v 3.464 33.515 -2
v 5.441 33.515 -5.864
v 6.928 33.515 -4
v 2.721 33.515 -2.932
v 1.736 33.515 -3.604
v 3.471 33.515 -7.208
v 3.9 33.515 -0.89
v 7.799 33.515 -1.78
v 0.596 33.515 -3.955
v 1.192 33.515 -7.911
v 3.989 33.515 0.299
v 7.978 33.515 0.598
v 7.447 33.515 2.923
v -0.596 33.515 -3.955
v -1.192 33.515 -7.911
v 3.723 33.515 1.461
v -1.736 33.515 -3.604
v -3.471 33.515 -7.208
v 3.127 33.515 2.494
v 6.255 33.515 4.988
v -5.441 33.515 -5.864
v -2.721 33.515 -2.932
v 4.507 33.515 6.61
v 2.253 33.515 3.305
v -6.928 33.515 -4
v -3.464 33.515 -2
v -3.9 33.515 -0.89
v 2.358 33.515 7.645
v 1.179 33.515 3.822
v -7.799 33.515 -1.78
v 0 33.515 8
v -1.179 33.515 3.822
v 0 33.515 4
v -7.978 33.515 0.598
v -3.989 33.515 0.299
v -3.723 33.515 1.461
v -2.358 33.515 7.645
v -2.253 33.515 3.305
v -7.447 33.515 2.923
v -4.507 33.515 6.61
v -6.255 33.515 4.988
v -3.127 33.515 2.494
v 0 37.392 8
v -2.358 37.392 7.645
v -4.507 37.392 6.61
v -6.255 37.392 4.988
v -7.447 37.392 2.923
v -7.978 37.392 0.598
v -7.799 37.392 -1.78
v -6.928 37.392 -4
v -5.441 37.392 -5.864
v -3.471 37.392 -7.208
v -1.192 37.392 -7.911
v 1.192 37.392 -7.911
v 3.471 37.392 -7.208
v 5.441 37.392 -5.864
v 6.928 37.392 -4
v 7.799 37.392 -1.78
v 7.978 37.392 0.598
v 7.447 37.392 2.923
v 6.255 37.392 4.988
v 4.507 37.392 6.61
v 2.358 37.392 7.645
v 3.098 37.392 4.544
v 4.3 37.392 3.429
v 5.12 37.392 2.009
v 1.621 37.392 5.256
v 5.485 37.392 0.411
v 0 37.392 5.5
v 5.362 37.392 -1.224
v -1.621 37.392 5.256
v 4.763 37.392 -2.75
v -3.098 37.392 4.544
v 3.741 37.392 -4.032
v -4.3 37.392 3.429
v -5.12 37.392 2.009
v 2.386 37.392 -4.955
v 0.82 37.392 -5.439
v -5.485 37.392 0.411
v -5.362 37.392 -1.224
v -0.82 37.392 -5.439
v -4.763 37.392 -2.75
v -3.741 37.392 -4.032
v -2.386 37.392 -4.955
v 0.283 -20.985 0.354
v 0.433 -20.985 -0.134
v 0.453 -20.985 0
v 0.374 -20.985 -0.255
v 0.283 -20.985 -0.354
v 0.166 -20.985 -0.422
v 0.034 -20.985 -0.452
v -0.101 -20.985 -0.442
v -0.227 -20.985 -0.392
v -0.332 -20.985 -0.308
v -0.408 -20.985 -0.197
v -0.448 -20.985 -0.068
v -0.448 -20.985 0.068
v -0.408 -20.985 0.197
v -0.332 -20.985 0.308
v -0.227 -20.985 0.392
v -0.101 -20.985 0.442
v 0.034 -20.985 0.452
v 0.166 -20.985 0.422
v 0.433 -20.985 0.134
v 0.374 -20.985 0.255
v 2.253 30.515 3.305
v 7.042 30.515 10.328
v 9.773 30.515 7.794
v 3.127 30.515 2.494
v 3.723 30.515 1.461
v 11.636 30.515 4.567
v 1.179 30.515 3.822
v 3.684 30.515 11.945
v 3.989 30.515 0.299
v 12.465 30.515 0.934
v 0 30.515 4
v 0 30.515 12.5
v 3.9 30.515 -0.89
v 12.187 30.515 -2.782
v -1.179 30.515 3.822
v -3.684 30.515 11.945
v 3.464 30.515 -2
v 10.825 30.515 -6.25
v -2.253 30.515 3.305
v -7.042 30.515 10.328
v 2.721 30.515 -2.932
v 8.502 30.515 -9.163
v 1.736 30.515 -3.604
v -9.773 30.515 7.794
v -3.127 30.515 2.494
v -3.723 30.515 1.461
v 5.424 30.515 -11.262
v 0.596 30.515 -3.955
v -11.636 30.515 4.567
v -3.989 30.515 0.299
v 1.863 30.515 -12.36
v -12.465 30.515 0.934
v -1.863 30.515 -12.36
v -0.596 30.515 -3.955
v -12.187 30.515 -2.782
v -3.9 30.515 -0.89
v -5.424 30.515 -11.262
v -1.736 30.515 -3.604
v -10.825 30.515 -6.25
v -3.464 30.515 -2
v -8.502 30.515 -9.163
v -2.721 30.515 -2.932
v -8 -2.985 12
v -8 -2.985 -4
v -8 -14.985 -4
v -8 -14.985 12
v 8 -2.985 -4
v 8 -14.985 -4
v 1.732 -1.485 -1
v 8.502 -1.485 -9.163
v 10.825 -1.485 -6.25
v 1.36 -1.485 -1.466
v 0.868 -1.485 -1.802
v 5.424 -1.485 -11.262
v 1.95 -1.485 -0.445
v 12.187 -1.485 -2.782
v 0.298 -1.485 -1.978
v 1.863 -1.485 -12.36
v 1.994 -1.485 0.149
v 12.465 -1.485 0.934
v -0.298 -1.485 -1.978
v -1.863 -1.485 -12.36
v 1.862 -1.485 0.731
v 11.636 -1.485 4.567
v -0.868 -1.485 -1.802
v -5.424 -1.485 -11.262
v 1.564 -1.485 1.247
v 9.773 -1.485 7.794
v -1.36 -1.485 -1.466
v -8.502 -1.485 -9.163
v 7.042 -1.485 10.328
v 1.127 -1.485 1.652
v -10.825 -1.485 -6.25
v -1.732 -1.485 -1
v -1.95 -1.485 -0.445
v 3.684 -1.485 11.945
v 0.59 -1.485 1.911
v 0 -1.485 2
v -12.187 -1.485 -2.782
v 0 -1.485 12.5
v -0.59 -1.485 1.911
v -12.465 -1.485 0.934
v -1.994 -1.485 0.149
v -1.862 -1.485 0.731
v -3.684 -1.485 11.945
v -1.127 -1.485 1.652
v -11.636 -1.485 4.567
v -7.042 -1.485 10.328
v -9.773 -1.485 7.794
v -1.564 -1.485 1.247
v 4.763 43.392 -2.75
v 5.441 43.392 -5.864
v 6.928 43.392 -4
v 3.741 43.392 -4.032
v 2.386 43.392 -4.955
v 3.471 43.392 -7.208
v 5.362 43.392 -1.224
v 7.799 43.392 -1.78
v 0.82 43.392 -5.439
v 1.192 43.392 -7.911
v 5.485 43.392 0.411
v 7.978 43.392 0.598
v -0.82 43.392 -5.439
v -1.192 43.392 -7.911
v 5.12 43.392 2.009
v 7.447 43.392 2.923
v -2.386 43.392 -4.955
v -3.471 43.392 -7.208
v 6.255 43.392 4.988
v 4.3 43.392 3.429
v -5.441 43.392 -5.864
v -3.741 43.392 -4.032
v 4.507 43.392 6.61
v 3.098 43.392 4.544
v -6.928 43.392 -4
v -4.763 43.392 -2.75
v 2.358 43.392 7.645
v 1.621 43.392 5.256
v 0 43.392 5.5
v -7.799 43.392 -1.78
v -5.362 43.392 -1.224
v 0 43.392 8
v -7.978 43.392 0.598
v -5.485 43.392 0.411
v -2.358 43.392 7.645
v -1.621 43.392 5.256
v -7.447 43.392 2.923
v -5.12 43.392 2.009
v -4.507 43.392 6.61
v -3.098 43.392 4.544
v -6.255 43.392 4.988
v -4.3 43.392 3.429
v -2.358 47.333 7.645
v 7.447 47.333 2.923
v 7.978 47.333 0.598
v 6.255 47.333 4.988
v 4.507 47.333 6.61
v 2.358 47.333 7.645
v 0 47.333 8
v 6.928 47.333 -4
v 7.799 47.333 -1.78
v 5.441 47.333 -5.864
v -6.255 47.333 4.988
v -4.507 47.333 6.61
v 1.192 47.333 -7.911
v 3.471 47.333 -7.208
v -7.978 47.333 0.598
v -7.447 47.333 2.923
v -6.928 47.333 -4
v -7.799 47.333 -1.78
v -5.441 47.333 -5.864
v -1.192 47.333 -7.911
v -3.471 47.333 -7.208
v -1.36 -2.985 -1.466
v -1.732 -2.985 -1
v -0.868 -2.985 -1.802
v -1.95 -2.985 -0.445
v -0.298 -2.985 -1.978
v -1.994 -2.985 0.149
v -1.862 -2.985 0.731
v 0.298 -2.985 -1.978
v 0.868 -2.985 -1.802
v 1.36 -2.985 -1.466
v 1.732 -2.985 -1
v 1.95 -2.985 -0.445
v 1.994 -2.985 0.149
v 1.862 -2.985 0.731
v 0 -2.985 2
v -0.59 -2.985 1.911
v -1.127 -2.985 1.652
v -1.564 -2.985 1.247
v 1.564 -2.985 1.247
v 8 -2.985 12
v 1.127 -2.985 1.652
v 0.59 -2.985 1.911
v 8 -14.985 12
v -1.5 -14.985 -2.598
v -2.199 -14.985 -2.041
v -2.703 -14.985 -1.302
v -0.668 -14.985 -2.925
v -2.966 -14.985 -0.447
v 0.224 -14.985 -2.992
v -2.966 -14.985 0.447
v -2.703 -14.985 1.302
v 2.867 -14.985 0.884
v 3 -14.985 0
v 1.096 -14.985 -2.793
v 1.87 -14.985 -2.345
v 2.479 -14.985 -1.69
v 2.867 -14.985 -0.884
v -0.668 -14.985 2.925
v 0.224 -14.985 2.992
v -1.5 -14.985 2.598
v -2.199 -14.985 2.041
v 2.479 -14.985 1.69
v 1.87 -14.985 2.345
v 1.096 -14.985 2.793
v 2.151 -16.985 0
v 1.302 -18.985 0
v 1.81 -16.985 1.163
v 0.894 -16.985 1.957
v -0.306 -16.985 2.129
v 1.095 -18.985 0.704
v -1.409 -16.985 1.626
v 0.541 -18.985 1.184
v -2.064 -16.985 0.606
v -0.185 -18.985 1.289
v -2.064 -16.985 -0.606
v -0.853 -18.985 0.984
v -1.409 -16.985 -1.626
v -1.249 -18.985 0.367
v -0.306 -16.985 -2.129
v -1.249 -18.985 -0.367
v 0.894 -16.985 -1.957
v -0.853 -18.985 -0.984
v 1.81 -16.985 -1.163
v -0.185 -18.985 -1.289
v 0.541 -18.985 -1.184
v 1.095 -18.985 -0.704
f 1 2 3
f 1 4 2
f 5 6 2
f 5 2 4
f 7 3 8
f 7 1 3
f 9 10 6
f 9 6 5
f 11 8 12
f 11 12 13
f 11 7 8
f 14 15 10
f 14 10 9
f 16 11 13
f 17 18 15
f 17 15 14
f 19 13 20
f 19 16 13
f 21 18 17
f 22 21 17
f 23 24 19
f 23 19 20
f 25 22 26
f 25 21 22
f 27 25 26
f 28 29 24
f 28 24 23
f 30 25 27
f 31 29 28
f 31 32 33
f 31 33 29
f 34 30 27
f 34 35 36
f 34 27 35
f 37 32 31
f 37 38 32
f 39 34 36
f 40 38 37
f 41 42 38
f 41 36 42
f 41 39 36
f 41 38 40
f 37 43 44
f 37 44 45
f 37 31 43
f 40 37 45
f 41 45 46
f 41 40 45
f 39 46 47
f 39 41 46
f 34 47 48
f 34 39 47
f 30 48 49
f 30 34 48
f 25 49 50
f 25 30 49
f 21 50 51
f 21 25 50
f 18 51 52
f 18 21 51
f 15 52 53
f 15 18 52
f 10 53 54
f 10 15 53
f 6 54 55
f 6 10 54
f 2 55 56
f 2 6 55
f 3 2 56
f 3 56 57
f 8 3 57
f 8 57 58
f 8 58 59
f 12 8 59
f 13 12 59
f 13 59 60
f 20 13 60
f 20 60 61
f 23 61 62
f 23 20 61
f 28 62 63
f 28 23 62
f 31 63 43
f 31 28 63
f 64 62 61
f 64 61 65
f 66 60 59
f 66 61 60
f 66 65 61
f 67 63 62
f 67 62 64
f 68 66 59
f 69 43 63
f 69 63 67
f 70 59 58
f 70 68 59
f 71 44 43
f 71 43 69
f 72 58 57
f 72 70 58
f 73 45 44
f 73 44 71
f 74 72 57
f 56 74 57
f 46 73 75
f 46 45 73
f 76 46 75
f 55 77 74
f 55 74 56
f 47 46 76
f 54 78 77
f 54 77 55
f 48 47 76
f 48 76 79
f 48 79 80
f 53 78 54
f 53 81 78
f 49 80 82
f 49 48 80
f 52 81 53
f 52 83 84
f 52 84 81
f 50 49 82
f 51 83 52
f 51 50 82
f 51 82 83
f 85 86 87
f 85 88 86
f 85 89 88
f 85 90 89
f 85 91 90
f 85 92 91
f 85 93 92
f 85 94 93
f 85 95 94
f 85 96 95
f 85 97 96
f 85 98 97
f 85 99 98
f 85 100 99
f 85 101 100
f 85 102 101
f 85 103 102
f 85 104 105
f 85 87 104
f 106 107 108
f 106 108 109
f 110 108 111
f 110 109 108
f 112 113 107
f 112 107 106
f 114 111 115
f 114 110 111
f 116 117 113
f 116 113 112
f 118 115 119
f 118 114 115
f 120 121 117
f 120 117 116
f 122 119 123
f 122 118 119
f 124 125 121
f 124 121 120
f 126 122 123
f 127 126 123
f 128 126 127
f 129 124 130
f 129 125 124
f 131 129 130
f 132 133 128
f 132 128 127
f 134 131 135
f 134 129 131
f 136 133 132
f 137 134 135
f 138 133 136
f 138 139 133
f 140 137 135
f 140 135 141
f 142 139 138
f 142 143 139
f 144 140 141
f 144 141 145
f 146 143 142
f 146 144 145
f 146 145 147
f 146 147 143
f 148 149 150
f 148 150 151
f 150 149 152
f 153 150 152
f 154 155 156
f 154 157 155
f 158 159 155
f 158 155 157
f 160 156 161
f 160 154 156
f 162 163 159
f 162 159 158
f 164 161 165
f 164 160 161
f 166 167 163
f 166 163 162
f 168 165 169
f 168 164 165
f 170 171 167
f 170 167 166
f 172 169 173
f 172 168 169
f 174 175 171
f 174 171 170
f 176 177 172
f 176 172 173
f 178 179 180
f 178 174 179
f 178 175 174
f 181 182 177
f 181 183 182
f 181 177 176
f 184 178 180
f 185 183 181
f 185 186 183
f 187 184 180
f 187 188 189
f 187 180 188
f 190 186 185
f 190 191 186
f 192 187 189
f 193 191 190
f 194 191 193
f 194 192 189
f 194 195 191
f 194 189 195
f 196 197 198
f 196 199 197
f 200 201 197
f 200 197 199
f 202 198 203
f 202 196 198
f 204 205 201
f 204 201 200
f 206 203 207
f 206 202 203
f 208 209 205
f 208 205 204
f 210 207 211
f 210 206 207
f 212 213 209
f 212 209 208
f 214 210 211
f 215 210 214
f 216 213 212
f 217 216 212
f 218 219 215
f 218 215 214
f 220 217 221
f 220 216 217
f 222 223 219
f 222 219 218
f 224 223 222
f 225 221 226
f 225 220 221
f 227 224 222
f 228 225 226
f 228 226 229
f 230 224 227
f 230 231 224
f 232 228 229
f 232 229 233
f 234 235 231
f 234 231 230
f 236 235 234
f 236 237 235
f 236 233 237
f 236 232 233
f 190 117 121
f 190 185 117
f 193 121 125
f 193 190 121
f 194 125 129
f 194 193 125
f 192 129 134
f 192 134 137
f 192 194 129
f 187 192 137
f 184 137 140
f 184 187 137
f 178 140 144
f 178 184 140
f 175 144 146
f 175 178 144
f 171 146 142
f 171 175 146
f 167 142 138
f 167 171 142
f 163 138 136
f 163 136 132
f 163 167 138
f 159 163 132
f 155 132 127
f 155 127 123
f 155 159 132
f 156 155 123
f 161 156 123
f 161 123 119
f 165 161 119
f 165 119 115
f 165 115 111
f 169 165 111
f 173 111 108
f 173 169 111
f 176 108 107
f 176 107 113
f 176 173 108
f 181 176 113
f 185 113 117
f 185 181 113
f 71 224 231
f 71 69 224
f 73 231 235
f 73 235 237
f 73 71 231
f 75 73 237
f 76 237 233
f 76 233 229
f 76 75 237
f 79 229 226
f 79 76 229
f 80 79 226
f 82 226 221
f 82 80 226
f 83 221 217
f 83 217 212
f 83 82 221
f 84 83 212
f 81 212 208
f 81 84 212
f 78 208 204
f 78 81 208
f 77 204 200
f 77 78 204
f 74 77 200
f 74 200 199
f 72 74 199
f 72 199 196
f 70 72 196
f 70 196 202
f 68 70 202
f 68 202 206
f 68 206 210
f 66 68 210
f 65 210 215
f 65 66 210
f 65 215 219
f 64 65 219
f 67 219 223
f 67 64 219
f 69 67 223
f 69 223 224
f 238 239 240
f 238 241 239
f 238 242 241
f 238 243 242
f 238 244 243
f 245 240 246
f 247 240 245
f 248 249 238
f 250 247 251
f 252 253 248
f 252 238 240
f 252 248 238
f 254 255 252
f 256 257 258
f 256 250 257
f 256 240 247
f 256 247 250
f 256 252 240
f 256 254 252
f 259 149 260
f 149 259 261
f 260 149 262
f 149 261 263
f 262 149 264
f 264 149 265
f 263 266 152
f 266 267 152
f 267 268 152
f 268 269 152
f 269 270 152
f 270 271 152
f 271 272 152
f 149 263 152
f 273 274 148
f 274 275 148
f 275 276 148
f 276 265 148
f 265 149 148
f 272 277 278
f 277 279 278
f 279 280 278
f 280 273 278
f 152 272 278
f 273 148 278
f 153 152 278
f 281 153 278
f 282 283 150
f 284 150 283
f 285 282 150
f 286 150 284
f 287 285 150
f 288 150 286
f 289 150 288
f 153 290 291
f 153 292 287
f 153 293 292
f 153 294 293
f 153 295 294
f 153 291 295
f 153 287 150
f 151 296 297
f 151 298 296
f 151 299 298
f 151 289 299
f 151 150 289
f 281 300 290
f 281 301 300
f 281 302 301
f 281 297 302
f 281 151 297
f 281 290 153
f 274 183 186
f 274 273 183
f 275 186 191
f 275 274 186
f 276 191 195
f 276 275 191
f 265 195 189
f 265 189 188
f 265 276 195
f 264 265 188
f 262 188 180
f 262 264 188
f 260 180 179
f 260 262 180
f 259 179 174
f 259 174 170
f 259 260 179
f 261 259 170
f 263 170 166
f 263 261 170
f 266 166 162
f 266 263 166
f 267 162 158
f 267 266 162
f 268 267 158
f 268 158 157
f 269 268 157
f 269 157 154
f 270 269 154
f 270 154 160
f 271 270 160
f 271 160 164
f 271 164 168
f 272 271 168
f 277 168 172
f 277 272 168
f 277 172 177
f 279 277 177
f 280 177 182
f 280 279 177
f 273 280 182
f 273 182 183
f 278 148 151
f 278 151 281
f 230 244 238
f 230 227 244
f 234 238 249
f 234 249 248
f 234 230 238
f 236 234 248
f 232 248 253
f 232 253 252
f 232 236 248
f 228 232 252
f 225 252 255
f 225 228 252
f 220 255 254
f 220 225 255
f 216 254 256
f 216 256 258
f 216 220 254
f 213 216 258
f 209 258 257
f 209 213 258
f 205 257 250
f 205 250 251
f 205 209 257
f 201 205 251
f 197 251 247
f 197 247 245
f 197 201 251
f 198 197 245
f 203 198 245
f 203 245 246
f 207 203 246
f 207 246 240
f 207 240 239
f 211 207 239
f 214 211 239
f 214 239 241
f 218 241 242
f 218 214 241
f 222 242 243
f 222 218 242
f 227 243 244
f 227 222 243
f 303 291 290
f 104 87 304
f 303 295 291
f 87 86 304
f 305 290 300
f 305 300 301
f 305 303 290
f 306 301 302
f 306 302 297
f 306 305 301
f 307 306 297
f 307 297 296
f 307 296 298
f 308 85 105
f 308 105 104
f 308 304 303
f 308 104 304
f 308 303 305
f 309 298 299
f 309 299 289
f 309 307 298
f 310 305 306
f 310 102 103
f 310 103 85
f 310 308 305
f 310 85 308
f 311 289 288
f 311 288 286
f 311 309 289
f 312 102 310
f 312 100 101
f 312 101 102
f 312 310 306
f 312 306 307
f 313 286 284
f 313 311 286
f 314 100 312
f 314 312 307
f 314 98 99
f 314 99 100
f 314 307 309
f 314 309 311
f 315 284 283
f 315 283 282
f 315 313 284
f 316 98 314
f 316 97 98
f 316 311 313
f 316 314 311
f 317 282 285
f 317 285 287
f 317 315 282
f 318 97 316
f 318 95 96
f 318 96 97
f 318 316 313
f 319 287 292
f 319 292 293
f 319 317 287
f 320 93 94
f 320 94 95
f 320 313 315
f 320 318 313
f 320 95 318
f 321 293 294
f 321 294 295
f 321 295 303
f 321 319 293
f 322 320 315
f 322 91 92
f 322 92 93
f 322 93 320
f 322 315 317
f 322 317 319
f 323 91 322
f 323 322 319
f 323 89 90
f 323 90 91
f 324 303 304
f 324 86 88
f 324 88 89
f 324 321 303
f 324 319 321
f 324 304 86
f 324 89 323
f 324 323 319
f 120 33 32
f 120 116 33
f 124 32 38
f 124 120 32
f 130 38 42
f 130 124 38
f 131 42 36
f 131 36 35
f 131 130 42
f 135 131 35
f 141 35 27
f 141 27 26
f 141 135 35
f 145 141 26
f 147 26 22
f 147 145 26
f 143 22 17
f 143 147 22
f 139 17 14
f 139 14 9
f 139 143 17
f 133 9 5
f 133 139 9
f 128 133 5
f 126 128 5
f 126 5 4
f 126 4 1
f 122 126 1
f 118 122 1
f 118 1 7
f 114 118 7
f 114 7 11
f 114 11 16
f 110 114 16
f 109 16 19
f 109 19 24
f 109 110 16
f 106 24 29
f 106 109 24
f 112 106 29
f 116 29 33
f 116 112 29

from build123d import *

# Parameters (mm, degrees)
ESBO_O3_W                = 16
ESBO_O3_H                = 16
RESSALTO_EXTRUS_O1_DEPTH = 12
ESBO_O4_R                = 3
RESSALTO_EXTRUS_O2_DEPTH = 6
RESSALTO_EXTRUS_O2_TAPER = 23


with BuildPart() as part:
    # Esboço1 → Revolução1 (revolve)
    with BuildSketch(Plane.XY, mode=Mode.PRIVATE) as revolu_o1_sk:
        Polygon((0, 47.333362218), (8, 47.333362218), (8, 43.391649695), (5.5, 43.391649695), (5.5, 37.391649695), (8, 37.391649695), (8, 33.514974639), (4, 33.514974639), (4, 30.514974639), (12.5, 30.514974639), (12.5, -1.485025361), (2, -1.485025361), (2, -2.985025361), (0, -2.985025361), align=None)
    revolve(revolu_o1_sk.sketch.rotate(Axis((0, 47.333362218, 0), (0, -1, 0)), 90), axis=Axis((0, 47.333362218, 0), (0, -1, 0)))

    # Esboço3 → Ressalto-extrusão1 (add)
    with BuildSketch(Plane.XZ.offset(2.985025361)):
        with Locations((0, 4)):
            Rectangle(ESBO_O3_W, ESBO_O3_H)
    extrude(amount=RESSALTO_EXTRUS_O1_DEPTH)

    # Esboço4 → Ressalto-extrusão2 (add)
    with BuildSketch(Plane.XZ.offset(14.985025361)):
        Circle(ESBO_O4_R)
    extrude(amount=RESSALTO_EXTRUS_O2_DEPTH, taper=RESSALTO_EXTRUS_O2_TAPER)


solid = part.part
